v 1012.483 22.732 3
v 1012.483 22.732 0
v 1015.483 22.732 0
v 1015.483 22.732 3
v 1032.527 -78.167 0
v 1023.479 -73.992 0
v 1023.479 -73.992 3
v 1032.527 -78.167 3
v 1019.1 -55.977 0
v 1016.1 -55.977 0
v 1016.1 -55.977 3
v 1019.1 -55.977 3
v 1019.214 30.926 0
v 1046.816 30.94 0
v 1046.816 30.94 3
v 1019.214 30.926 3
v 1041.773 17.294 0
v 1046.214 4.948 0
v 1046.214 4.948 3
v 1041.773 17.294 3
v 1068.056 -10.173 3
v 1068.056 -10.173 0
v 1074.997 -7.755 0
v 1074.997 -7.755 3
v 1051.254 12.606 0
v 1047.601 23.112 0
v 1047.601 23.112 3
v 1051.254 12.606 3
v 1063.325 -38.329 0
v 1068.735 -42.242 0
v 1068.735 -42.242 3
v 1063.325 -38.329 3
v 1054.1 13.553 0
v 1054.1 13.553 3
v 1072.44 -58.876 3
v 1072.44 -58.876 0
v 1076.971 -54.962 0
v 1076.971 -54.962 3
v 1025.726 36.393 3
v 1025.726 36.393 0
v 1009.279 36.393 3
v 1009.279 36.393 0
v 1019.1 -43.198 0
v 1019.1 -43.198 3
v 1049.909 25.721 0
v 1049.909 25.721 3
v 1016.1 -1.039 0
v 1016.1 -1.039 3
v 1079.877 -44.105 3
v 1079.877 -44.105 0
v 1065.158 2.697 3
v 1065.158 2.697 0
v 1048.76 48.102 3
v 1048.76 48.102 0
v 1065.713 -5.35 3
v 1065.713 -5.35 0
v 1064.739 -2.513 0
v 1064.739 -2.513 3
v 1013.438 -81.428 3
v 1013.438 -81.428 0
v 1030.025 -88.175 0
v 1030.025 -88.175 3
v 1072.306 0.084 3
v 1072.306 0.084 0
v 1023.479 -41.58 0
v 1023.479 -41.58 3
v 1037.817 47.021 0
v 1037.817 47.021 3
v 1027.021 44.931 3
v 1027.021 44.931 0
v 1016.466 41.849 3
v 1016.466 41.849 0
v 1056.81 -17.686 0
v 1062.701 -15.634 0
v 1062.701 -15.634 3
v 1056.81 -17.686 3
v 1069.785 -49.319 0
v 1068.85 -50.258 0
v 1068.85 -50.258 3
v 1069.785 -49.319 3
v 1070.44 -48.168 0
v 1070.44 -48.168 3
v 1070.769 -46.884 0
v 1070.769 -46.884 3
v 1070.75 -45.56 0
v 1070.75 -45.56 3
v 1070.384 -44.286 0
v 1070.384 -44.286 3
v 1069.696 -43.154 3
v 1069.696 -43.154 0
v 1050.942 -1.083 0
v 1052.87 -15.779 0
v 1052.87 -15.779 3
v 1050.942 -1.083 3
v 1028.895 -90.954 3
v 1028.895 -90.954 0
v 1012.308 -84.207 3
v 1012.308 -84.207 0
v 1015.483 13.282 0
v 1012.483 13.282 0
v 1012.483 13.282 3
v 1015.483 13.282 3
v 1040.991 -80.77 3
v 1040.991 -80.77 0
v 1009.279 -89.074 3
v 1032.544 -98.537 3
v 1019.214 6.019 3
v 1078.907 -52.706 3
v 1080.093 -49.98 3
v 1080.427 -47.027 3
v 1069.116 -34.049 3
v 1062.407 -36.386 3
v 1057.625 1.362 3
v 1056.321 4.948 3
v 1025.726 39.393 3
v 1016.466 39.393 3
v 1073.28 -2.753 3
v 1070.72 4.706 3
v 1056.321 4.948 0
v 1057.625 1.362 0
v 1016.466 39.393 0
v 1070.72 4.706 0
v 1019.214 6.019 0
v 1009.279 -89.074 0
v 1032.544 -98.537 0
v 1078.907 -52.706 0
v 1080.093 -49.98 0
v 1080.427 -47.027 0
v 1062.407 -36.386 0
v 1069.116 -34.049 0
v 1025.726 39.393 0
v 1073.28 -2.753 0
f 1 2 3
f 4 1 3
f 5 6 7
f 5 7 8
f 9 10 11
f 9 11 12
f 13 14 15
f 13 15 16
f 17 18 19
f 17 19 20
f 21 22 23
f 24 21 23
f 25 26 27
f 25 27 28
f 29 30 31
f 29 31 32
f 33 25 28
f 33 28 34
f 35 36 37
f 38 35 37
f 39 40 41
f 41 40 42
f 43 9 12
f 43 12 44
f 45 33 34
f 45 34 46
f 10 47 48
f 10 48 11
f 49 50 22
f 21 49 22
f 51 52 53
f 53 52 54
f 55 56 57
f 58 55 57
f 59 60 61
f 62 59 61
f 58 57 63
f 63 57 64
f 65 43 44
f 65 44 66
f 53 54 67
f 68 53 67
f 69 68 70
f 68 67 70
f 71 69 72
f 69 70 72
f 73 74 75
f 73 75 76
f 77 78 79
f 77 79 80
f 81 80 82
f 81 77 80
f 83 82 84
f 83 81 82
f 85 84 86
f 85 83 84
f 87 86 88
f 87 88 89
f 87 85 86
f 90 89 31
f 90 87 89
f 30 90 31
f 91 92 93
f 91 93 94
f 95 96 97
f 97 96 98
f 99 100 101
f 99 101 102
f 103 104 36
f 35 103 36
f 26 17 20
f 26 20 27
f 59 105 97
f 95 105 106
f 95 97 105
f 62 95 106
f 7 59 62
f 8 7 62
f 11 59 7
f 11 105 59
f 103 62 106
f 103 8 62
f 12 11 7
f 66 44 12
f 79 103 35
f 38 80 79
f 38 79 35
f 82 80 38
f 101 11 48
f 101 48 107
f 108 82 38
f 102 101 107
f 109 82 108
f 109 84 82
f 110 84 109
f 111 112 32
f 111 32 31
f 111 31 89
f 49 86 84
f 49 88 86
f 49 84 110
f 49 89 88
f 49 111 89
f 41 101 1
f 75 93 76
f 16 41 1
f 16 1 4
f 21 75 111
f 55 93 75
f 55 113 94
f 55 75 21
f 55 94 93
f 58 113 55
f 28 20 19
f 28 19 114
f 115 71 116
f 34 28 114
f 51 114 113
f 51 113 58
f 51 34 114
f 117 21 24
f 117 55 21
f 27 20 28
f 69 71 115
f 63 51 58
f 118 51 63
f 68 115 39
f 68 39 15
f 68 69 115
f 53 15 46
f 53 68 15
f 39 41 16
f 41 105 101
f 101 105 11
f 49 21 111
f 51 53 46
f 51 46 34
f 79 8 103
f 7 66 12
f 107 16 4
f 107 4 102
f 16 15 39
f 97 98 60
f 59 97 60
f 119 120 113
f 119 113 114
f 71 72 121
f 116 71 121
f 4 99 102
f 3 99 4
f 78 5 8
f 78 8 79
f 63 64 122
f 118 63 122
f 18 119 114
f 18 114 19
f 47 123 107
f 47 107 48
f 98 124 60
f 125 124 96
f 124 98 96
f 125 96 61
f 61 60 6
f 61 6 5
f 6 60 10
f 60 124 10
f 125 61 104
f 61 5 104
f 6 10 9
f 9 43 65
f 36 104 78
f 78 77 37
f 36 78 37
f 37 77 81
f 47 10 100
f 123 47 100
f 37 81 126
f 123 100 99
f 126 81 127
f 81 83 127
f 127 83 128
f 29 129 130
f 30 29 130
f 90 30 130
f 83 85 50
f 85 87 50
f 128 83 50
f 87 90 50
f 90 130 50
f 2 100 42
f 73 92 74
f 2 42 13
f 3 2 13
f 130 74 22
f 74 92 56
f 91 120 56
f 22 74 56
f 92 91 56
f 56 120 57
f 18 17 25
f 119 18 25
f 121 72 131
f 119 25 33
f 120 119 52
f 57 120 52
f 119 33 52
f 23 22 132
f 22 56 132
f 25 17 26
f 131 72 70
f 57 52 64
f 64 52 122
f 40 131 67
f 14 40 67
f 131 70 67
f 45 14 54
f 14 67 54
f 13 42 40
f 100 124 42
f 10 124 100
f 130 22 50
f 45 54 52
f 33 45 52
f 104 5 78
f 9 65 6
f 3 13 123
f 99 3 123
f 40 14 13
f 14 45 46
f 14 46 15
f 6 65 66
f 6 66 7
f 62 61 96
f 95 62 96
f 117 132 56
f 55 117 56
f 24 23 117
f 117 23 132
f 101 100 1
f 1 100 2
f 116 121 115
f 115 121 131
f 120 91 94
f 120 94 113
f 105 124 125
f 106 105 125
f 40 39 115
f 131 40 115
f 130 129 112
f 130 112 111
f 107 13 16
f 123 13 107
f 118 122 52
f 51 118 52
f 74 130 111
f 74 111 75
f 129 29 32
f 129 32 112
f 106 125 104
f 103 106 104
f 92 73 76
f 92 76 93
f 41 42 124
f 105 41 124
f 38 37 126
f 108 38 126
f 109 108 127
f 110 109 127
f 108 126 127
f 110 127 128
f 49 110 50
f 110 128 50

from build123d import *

# Parameters (mm, degrees)
SKETCH1_W           = 3
SKETCH1_H           = 9.45
BASE_EXTRUDE_DEPTH  = 3
SKETCH2_W           = 10
SKETCH2_H           = 3
BOSS_EXTRUDE1_DEPTH = 3


with BuildPart() as part:
    # Sketch1 → Base-Extrude (new body)
    with BuildSketch(Plane.XY):
        with BuildLine():
            Line((1079.876919763, -44.105153511), (1068.056216666, -10.172974917))
            Line((1068.056216666, -10.172974917), (1074.996757052, -7.75514999))
            Line((1074.996757052, -7.75514999), (1073.279825248, -2.753207543))
            Line((1073.279825248, -2.753207543), (1065.713177122, -5.350482293))
            Line((1065.713177122, -5.350482293), (1064.73919909, -2.512989245))
            Line((1064.73919909, -2.512989245), (1072.305847217, 0.084285505))
            Line((1072.305847217, 0.084285505), (1070.719575987, 4.705574119))
            Line((1070.719575987, 4.705574119), (1065.157526034, 2.696840543))
            Line((1065.157526034, 2.696840543), (1048.759611565, 48.101577381))
            ThreePointArc((1048.759611565, 48.101577381), (1032.39485012, 46.101647559), (1016.466345621, 41.848662618))
            Line((1016.466345621, 41.848662618), (1016.466345621, 39.392602571))
            Line((1016.466345621, 39.392602571), (1035.726137056, 39.392602571))
            Line((1035.726137056, 39.392602571), (1035.726137056, 36.392602571))
            Line((1035.726137056, 36.392602571), (1009.279499751, 36.392602571))
            Line((1009.279499751, 36.392602571), (1009.279499751, -89.073987735))
            Line((1009.279499751, -89.073987735), (1032.543515661, -98.536722682))
            Line((1032.543515661, -98.536722682), (1040.991113984, -80.770341528))
            Line((1040.991113984, -80.770341528), (1072.440441541, -58.876157059))
            Line((1072.440441541, -58.876157059), (1076.9710582, -54.961956755))
            ThreePointArc((1076.9710582, -54.961956755), (1080.093496996, -49.980404823), (1079.876919763, -44.105153511))
        make_face()
        with BuildLine():
            Line((1019.213878108, 30.925856164), (1019.213878108, 6.018771541))
            Line((1019.213878108, 6.018771541), (1016.100082492, -1.038872257))
            Line((1016.100082492, -1.038872257), (1016.100082492, -55.976738358))
            Line((1016.100082492, -55.976738358), (1019.100082492, -55.976738358))
            Line((1019.100082492, -55.976738358), (1019.100082492, -43.198135443))
            Line((1019.100082492, -43.198135443), (1023.478597046, -41.580404808))
            Line((1023.478597046, -41.580404808), (1023.478597046, -73.992128786))
            Line((1023.478597046, -73.992128786), (1032.526582577, -78.167039678))
            Line((1032.526582577, -78.167039678), (1068.850484509, -50.258348586))
            ThreePointArc((1068.850484509, -50.258348586), (1070.803657728, -46.221334872), (1068.734776871, -42.242378056))
            Line((1068.734776871, -42.242378056), (1063.325122863, -38.329012558))
            Line((1063.325122863, -38.329012558), (1062.407393196, -36.386031272))
            Line((1062.407393196, -36.386031272), (1069.115709638, -34.04910449))
            Line((1069.115709638, -34.04910449), (1062.700744223, -15.634484789))
            Line((1062.700744223, -15.634484789), (1056.810312455, -17.686491112))
            Line((1056.810312455, -17.686491112), (1052.869598475, -15.779326268))
            Line((1052.869598475, -15.779326268), (1050.941521122, -1.083078235))
            Line((1050.941521122, -1.083078235), (1057.625060998, 1.362146575))
            Line((1057.625060998, 1.362146575), (1056.321001716, 4.948397029))
            Line((1056.321001716, 4.948397029), (1046.214175082, 4.948397029))
            Line((1046.214175082, 4.948397029), (1041.773169547, 17.294470752))
            Line((1041.773169547, 17.294470752), (1047.600835278, 23.111994965))
            Line((1047.600835278, 23.111994965), (1051.253809923, 12.605592538))
            Line((1051.253809923, 12.605592538), (1054.100349004, 13.552807012))
            Line((1054.100349004, 13.552807012), (1049.909104568, 25.720739733))
            Line((1049.909104568, 25.720739733), (1046.816291402, 30.939914406))
            Line((1046.816291402, 30.939914406), (1019.213878108, 30.925856164))
        make_face(mode=Mode.SUBTRACT)
        Polygon((1012.307844389, -84.207250741), (1013.438177941, -81.428339792), (1030.025357256, -88.175243766), (1028.895023704, -90.954154714), align=None, mode=Mode.SUBTRACT)
        with Locations((1013.982987836, 18.006853638)):
            Rectangle(SKETCH1_W, SKETCH1_H, mode=Mode.SUBTRACT)
    extrude(amount=BASE_EXTRUDE_DEPTH)

    # Sketch2 → Boss-Extrude1 (add)
    with BuildSketch(Plane.XY.offset(3)):
        with Locations((1030.726137056, 37.892602571)):
            Rectangle(SKETCH2_W, SKETCH2_H)
    extrude(amount=-BOSS_EXTRUDE1_DEPTH)


solid = part.part
